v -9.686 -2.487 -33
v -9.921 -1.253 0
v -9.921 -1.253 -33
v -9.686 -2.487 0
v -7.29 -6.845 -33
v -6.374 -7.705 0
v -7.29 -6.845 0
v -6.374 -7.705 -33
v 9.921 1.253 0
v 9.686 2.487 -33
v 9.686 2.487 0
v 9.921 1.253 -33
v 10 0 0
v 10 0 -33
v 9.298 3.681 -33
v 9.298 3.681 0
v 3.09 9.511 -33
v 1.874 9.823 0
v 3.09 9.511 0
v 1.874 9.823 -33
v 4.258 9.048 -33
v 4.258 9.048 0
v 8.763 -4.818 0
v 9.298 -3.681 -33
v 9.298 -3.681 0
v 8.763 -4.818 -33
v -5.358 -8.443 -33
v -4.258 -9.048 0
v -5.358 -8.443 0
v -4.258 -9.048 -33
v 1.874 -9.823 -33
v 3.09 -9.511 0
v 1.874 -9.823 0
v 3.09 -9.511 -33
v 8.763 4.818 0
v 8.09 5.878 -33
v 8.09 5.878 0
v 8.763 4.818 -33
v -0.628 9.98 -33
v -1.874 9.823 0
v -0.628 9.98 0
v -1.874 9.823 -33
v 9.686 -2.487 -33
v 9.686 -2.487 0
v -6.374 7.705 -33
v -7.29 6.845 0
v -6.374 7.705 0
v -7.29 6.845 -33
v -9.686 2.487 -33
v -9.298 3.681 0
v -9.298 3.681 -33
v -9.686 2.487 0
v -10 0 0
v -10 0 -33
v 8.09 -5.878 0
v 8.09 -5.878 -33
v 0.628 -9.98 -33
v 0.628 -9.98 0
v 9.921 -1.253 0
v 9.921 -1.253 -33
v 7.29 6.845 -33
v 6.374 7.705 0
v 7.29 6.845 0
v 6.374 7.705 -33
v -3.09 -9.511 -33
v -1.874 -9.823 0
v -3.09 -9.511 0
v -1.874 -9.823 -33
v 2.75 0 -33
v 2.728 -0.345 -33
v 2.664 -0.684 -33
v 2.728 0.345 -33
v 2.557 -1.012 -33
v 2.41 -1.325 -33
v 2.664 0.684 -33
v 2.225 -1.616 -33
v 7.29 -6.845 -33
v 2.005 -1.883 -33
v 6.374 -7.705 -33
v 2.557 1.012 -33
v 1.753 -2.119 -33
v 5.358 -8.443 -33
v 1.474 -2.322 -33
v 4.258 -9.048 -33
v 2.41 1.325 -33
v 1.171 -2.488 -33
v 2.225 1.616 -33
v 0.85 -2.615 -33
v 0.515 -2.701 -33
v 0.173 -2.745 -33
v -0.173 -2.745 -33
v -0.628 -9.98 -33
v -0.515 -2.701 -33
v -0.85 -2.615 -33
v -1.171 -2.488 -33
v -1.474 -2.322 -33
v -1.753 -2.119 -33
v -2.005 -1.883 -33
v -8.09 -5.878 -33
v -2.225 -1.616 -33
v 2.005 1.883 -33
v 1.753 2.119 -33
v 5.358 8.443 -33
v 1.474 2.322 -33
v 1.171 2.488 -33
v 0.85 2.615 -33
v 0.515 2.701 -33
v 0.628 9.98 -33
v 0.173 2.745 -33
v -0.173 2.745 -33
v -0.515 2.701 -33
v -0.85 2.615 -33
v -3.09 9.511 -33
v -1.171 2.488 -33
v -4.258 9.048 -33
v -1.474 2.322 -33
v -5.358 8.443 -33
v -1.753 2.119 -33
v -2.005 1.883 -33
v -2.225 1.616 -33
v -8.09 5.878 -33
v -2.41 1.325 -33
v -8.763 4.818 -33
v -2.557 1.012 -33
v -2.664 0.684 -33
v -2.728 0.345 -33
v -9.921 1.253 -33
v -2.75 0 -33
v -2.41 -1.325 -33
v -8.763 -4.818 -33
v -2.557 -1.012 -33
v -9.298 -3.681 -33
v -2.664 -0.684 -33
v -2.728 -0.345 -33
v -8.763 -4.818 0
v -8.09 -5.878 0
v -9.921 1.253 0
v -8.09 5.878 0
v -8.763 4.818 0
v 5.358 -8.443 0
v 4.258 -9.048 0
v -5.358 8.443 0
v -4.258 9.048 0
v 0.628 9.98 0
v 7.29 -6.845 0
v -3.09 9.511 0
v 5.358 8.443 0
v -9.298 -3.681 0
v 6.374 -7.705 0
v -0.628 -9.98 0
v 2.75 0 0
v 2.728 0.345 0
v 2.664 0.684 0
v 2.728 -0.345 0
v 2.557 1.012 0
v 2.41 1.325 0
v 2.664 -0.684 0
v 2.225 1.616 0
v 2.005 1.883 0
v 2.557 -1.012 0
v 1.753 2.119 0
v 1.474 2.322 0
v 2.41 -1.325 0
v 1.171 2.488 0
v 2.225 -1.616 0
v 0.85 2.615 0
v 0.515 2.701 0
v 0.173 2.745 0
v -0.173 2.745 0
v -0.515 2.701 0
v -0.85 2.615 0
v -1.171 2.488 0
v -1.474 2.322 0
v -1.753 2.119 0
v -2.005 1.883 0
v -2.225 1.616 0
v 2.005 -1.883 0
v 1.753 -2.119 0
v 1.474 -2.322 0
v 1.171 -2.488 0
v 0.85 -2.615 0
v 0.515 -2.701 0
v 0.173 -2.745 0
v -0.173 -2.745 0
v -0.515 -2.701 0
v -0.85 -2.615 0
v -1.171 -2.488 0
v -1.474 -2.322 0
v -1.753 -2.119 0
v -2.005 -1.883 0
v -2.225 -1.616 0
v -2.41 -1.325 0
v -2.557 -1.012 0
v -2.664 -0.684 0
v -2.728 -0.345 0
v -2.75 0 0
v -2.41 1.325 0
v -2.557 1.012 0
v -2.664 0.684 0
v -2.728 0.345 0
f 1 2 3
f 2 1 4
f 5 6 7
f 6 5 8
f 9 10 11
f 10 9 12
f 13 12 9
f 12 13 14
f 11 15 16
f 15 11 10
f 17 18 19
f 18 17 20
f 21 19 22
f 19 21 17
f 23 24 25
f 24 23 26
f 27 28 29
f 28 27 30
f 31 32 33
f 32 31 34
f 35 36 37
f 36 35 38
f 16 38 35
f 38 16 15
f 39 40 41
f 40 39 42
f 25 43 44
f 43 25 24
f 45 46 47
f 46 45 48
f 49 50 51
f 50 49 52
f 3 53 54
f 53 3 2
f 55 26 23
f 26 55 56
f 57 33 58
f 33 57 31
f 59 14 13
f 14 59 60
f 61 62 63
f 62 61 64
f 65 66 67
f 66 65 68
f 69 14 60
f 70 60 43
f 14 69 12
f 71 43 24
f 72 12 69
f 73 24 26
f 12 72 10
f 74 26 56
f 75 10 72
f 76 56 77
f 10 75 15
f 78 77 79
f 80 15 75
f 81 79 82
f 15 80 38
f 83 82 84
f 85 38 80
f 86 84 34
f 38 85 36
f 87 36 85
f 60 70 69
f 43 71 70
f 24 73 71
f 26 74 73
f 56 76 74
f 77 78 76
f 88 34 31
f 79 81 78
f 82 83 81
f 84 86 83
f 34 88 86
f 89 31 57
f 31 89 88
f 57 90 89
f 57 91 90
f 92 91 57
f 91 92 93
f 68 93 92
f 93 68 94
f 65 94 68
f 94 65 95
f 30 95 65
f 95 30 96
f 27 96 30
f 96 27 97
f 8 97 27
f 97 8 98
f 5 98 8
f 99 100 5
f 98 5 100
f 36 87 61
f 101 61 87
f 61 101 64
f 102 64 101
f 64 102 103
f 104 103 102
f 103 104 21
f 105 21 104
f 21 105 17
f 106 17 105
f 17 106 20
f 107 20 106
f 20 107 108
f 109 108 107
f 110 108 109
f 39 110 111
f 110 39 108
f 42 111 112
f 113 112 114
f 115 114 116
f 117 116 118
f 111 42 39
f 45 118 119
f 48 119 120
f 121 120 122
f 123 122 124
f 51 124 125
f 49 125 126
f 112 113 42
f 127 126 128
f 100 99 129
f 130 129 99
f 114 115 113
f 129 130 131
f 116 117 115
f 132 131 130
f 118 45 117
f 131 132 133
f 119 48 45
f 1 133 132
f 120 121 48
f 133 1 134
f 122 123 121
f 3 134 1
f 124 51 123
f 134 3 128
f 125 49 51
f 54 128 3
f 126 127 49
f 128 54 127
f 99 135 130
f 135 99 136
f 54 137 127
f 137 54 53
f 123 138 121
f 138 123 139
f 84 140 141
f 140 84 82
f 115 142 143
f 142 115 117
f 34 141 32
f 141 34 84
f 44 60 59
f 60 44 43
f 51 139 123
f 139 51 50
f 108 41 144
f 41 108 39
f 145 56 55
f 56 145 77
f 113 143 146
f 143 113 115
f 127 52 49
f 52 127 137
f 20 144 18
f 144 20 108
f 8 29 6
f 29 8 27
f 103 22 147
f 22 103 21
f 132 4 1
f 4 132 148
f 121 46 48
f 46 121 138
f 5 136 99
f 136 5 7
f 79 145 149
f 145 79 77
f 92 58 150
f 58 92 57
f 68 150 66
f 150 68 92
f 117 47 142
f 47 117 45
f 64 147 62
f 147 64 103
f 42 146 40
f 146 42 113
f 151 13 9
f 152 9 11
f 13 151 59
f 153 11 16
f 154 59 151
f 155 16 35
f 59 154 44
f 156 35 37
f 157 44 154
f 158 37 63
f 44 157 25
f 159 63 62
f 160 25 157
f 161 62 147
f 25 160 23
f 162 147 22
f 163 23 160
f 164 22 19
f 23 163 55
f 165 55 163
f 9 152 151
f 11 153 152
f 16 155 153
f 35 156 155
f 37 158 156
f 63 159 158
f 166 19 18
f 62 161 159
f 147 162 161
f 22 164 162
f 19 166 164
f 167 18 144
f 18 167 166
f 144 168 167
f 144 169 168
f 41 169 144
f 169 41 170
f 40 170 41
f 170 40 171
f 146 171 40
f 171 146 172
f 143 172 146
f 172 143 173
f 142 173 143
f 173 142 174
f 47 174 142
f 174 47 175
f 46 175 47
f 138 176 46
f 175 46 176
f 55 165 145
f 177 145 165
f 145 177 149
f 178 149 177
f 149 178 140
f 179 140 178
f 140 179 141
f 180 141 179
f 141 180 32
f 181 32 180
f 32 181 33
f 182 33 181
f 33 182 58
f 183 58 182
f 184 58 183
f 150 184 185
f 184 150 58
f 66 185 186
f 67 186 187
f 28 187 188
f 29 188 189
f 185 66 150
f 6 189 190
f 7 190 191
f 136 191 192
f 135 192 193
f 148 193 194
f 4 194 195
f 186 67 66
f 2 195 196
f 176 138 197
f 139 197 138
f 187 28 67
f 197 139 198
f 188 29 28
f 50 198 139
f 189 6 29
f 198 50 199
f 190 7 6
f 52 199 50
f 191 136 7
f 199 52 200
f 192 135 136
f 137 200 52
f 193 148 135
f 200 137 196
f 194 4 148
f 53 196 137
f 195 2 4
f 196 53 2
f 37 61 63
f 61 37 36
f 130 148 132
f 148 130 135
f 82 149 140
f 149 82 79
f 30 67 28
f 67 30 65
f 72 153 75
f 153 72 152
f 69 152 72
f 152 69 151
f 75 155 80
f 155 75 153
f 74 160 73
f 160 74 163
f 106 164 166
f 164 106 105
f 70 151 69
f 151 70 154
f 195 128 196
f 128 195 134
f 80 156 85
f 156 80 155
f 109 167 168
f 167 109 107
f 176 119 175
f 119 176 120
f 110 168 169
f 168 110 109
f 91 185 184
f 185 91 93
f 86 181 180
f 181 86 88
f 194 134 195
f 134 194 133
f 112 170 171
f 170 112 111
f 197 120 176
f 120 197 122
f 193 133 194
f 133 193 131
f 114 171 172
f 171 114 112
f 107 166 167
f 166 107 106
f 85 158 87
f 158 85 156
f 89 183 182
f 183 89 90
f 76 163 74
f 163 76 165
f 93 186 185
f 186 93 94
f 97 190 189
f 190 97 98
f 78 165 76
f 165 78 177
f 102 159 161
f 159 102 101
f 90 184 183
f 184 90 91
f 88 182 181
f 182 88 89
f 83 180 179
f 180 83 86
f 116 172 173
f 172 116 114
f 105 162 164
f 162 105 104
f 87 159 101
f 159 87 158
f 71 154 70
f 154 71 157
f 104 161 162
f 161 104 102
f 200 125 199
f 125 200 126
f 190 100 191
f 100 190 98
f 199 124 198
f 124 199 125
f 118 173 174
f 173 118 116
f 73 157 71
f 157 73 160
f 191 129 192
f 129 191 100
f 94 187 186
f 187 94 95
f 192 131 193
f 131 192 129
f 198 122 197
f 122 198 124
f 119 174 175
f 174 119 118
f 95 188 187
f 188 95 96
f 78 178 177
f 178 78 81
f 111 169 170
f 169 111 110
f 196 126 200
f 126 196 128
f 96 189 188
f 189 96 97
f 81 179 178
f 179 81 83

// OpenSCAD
$fn = 50;


difference() {
	union() {
		translate(v = [0, 0, -33.0000000000]) {
			cylinder(h = 33, r = 10.0000000000);
		}
		cylinder(h = 0, r = 19.0000000000);
	}
	union() {
		#translate(v = [0, 0, -33]) {
			cylinder(h = 33, r = 2.7500000000);
		}
	}
}
